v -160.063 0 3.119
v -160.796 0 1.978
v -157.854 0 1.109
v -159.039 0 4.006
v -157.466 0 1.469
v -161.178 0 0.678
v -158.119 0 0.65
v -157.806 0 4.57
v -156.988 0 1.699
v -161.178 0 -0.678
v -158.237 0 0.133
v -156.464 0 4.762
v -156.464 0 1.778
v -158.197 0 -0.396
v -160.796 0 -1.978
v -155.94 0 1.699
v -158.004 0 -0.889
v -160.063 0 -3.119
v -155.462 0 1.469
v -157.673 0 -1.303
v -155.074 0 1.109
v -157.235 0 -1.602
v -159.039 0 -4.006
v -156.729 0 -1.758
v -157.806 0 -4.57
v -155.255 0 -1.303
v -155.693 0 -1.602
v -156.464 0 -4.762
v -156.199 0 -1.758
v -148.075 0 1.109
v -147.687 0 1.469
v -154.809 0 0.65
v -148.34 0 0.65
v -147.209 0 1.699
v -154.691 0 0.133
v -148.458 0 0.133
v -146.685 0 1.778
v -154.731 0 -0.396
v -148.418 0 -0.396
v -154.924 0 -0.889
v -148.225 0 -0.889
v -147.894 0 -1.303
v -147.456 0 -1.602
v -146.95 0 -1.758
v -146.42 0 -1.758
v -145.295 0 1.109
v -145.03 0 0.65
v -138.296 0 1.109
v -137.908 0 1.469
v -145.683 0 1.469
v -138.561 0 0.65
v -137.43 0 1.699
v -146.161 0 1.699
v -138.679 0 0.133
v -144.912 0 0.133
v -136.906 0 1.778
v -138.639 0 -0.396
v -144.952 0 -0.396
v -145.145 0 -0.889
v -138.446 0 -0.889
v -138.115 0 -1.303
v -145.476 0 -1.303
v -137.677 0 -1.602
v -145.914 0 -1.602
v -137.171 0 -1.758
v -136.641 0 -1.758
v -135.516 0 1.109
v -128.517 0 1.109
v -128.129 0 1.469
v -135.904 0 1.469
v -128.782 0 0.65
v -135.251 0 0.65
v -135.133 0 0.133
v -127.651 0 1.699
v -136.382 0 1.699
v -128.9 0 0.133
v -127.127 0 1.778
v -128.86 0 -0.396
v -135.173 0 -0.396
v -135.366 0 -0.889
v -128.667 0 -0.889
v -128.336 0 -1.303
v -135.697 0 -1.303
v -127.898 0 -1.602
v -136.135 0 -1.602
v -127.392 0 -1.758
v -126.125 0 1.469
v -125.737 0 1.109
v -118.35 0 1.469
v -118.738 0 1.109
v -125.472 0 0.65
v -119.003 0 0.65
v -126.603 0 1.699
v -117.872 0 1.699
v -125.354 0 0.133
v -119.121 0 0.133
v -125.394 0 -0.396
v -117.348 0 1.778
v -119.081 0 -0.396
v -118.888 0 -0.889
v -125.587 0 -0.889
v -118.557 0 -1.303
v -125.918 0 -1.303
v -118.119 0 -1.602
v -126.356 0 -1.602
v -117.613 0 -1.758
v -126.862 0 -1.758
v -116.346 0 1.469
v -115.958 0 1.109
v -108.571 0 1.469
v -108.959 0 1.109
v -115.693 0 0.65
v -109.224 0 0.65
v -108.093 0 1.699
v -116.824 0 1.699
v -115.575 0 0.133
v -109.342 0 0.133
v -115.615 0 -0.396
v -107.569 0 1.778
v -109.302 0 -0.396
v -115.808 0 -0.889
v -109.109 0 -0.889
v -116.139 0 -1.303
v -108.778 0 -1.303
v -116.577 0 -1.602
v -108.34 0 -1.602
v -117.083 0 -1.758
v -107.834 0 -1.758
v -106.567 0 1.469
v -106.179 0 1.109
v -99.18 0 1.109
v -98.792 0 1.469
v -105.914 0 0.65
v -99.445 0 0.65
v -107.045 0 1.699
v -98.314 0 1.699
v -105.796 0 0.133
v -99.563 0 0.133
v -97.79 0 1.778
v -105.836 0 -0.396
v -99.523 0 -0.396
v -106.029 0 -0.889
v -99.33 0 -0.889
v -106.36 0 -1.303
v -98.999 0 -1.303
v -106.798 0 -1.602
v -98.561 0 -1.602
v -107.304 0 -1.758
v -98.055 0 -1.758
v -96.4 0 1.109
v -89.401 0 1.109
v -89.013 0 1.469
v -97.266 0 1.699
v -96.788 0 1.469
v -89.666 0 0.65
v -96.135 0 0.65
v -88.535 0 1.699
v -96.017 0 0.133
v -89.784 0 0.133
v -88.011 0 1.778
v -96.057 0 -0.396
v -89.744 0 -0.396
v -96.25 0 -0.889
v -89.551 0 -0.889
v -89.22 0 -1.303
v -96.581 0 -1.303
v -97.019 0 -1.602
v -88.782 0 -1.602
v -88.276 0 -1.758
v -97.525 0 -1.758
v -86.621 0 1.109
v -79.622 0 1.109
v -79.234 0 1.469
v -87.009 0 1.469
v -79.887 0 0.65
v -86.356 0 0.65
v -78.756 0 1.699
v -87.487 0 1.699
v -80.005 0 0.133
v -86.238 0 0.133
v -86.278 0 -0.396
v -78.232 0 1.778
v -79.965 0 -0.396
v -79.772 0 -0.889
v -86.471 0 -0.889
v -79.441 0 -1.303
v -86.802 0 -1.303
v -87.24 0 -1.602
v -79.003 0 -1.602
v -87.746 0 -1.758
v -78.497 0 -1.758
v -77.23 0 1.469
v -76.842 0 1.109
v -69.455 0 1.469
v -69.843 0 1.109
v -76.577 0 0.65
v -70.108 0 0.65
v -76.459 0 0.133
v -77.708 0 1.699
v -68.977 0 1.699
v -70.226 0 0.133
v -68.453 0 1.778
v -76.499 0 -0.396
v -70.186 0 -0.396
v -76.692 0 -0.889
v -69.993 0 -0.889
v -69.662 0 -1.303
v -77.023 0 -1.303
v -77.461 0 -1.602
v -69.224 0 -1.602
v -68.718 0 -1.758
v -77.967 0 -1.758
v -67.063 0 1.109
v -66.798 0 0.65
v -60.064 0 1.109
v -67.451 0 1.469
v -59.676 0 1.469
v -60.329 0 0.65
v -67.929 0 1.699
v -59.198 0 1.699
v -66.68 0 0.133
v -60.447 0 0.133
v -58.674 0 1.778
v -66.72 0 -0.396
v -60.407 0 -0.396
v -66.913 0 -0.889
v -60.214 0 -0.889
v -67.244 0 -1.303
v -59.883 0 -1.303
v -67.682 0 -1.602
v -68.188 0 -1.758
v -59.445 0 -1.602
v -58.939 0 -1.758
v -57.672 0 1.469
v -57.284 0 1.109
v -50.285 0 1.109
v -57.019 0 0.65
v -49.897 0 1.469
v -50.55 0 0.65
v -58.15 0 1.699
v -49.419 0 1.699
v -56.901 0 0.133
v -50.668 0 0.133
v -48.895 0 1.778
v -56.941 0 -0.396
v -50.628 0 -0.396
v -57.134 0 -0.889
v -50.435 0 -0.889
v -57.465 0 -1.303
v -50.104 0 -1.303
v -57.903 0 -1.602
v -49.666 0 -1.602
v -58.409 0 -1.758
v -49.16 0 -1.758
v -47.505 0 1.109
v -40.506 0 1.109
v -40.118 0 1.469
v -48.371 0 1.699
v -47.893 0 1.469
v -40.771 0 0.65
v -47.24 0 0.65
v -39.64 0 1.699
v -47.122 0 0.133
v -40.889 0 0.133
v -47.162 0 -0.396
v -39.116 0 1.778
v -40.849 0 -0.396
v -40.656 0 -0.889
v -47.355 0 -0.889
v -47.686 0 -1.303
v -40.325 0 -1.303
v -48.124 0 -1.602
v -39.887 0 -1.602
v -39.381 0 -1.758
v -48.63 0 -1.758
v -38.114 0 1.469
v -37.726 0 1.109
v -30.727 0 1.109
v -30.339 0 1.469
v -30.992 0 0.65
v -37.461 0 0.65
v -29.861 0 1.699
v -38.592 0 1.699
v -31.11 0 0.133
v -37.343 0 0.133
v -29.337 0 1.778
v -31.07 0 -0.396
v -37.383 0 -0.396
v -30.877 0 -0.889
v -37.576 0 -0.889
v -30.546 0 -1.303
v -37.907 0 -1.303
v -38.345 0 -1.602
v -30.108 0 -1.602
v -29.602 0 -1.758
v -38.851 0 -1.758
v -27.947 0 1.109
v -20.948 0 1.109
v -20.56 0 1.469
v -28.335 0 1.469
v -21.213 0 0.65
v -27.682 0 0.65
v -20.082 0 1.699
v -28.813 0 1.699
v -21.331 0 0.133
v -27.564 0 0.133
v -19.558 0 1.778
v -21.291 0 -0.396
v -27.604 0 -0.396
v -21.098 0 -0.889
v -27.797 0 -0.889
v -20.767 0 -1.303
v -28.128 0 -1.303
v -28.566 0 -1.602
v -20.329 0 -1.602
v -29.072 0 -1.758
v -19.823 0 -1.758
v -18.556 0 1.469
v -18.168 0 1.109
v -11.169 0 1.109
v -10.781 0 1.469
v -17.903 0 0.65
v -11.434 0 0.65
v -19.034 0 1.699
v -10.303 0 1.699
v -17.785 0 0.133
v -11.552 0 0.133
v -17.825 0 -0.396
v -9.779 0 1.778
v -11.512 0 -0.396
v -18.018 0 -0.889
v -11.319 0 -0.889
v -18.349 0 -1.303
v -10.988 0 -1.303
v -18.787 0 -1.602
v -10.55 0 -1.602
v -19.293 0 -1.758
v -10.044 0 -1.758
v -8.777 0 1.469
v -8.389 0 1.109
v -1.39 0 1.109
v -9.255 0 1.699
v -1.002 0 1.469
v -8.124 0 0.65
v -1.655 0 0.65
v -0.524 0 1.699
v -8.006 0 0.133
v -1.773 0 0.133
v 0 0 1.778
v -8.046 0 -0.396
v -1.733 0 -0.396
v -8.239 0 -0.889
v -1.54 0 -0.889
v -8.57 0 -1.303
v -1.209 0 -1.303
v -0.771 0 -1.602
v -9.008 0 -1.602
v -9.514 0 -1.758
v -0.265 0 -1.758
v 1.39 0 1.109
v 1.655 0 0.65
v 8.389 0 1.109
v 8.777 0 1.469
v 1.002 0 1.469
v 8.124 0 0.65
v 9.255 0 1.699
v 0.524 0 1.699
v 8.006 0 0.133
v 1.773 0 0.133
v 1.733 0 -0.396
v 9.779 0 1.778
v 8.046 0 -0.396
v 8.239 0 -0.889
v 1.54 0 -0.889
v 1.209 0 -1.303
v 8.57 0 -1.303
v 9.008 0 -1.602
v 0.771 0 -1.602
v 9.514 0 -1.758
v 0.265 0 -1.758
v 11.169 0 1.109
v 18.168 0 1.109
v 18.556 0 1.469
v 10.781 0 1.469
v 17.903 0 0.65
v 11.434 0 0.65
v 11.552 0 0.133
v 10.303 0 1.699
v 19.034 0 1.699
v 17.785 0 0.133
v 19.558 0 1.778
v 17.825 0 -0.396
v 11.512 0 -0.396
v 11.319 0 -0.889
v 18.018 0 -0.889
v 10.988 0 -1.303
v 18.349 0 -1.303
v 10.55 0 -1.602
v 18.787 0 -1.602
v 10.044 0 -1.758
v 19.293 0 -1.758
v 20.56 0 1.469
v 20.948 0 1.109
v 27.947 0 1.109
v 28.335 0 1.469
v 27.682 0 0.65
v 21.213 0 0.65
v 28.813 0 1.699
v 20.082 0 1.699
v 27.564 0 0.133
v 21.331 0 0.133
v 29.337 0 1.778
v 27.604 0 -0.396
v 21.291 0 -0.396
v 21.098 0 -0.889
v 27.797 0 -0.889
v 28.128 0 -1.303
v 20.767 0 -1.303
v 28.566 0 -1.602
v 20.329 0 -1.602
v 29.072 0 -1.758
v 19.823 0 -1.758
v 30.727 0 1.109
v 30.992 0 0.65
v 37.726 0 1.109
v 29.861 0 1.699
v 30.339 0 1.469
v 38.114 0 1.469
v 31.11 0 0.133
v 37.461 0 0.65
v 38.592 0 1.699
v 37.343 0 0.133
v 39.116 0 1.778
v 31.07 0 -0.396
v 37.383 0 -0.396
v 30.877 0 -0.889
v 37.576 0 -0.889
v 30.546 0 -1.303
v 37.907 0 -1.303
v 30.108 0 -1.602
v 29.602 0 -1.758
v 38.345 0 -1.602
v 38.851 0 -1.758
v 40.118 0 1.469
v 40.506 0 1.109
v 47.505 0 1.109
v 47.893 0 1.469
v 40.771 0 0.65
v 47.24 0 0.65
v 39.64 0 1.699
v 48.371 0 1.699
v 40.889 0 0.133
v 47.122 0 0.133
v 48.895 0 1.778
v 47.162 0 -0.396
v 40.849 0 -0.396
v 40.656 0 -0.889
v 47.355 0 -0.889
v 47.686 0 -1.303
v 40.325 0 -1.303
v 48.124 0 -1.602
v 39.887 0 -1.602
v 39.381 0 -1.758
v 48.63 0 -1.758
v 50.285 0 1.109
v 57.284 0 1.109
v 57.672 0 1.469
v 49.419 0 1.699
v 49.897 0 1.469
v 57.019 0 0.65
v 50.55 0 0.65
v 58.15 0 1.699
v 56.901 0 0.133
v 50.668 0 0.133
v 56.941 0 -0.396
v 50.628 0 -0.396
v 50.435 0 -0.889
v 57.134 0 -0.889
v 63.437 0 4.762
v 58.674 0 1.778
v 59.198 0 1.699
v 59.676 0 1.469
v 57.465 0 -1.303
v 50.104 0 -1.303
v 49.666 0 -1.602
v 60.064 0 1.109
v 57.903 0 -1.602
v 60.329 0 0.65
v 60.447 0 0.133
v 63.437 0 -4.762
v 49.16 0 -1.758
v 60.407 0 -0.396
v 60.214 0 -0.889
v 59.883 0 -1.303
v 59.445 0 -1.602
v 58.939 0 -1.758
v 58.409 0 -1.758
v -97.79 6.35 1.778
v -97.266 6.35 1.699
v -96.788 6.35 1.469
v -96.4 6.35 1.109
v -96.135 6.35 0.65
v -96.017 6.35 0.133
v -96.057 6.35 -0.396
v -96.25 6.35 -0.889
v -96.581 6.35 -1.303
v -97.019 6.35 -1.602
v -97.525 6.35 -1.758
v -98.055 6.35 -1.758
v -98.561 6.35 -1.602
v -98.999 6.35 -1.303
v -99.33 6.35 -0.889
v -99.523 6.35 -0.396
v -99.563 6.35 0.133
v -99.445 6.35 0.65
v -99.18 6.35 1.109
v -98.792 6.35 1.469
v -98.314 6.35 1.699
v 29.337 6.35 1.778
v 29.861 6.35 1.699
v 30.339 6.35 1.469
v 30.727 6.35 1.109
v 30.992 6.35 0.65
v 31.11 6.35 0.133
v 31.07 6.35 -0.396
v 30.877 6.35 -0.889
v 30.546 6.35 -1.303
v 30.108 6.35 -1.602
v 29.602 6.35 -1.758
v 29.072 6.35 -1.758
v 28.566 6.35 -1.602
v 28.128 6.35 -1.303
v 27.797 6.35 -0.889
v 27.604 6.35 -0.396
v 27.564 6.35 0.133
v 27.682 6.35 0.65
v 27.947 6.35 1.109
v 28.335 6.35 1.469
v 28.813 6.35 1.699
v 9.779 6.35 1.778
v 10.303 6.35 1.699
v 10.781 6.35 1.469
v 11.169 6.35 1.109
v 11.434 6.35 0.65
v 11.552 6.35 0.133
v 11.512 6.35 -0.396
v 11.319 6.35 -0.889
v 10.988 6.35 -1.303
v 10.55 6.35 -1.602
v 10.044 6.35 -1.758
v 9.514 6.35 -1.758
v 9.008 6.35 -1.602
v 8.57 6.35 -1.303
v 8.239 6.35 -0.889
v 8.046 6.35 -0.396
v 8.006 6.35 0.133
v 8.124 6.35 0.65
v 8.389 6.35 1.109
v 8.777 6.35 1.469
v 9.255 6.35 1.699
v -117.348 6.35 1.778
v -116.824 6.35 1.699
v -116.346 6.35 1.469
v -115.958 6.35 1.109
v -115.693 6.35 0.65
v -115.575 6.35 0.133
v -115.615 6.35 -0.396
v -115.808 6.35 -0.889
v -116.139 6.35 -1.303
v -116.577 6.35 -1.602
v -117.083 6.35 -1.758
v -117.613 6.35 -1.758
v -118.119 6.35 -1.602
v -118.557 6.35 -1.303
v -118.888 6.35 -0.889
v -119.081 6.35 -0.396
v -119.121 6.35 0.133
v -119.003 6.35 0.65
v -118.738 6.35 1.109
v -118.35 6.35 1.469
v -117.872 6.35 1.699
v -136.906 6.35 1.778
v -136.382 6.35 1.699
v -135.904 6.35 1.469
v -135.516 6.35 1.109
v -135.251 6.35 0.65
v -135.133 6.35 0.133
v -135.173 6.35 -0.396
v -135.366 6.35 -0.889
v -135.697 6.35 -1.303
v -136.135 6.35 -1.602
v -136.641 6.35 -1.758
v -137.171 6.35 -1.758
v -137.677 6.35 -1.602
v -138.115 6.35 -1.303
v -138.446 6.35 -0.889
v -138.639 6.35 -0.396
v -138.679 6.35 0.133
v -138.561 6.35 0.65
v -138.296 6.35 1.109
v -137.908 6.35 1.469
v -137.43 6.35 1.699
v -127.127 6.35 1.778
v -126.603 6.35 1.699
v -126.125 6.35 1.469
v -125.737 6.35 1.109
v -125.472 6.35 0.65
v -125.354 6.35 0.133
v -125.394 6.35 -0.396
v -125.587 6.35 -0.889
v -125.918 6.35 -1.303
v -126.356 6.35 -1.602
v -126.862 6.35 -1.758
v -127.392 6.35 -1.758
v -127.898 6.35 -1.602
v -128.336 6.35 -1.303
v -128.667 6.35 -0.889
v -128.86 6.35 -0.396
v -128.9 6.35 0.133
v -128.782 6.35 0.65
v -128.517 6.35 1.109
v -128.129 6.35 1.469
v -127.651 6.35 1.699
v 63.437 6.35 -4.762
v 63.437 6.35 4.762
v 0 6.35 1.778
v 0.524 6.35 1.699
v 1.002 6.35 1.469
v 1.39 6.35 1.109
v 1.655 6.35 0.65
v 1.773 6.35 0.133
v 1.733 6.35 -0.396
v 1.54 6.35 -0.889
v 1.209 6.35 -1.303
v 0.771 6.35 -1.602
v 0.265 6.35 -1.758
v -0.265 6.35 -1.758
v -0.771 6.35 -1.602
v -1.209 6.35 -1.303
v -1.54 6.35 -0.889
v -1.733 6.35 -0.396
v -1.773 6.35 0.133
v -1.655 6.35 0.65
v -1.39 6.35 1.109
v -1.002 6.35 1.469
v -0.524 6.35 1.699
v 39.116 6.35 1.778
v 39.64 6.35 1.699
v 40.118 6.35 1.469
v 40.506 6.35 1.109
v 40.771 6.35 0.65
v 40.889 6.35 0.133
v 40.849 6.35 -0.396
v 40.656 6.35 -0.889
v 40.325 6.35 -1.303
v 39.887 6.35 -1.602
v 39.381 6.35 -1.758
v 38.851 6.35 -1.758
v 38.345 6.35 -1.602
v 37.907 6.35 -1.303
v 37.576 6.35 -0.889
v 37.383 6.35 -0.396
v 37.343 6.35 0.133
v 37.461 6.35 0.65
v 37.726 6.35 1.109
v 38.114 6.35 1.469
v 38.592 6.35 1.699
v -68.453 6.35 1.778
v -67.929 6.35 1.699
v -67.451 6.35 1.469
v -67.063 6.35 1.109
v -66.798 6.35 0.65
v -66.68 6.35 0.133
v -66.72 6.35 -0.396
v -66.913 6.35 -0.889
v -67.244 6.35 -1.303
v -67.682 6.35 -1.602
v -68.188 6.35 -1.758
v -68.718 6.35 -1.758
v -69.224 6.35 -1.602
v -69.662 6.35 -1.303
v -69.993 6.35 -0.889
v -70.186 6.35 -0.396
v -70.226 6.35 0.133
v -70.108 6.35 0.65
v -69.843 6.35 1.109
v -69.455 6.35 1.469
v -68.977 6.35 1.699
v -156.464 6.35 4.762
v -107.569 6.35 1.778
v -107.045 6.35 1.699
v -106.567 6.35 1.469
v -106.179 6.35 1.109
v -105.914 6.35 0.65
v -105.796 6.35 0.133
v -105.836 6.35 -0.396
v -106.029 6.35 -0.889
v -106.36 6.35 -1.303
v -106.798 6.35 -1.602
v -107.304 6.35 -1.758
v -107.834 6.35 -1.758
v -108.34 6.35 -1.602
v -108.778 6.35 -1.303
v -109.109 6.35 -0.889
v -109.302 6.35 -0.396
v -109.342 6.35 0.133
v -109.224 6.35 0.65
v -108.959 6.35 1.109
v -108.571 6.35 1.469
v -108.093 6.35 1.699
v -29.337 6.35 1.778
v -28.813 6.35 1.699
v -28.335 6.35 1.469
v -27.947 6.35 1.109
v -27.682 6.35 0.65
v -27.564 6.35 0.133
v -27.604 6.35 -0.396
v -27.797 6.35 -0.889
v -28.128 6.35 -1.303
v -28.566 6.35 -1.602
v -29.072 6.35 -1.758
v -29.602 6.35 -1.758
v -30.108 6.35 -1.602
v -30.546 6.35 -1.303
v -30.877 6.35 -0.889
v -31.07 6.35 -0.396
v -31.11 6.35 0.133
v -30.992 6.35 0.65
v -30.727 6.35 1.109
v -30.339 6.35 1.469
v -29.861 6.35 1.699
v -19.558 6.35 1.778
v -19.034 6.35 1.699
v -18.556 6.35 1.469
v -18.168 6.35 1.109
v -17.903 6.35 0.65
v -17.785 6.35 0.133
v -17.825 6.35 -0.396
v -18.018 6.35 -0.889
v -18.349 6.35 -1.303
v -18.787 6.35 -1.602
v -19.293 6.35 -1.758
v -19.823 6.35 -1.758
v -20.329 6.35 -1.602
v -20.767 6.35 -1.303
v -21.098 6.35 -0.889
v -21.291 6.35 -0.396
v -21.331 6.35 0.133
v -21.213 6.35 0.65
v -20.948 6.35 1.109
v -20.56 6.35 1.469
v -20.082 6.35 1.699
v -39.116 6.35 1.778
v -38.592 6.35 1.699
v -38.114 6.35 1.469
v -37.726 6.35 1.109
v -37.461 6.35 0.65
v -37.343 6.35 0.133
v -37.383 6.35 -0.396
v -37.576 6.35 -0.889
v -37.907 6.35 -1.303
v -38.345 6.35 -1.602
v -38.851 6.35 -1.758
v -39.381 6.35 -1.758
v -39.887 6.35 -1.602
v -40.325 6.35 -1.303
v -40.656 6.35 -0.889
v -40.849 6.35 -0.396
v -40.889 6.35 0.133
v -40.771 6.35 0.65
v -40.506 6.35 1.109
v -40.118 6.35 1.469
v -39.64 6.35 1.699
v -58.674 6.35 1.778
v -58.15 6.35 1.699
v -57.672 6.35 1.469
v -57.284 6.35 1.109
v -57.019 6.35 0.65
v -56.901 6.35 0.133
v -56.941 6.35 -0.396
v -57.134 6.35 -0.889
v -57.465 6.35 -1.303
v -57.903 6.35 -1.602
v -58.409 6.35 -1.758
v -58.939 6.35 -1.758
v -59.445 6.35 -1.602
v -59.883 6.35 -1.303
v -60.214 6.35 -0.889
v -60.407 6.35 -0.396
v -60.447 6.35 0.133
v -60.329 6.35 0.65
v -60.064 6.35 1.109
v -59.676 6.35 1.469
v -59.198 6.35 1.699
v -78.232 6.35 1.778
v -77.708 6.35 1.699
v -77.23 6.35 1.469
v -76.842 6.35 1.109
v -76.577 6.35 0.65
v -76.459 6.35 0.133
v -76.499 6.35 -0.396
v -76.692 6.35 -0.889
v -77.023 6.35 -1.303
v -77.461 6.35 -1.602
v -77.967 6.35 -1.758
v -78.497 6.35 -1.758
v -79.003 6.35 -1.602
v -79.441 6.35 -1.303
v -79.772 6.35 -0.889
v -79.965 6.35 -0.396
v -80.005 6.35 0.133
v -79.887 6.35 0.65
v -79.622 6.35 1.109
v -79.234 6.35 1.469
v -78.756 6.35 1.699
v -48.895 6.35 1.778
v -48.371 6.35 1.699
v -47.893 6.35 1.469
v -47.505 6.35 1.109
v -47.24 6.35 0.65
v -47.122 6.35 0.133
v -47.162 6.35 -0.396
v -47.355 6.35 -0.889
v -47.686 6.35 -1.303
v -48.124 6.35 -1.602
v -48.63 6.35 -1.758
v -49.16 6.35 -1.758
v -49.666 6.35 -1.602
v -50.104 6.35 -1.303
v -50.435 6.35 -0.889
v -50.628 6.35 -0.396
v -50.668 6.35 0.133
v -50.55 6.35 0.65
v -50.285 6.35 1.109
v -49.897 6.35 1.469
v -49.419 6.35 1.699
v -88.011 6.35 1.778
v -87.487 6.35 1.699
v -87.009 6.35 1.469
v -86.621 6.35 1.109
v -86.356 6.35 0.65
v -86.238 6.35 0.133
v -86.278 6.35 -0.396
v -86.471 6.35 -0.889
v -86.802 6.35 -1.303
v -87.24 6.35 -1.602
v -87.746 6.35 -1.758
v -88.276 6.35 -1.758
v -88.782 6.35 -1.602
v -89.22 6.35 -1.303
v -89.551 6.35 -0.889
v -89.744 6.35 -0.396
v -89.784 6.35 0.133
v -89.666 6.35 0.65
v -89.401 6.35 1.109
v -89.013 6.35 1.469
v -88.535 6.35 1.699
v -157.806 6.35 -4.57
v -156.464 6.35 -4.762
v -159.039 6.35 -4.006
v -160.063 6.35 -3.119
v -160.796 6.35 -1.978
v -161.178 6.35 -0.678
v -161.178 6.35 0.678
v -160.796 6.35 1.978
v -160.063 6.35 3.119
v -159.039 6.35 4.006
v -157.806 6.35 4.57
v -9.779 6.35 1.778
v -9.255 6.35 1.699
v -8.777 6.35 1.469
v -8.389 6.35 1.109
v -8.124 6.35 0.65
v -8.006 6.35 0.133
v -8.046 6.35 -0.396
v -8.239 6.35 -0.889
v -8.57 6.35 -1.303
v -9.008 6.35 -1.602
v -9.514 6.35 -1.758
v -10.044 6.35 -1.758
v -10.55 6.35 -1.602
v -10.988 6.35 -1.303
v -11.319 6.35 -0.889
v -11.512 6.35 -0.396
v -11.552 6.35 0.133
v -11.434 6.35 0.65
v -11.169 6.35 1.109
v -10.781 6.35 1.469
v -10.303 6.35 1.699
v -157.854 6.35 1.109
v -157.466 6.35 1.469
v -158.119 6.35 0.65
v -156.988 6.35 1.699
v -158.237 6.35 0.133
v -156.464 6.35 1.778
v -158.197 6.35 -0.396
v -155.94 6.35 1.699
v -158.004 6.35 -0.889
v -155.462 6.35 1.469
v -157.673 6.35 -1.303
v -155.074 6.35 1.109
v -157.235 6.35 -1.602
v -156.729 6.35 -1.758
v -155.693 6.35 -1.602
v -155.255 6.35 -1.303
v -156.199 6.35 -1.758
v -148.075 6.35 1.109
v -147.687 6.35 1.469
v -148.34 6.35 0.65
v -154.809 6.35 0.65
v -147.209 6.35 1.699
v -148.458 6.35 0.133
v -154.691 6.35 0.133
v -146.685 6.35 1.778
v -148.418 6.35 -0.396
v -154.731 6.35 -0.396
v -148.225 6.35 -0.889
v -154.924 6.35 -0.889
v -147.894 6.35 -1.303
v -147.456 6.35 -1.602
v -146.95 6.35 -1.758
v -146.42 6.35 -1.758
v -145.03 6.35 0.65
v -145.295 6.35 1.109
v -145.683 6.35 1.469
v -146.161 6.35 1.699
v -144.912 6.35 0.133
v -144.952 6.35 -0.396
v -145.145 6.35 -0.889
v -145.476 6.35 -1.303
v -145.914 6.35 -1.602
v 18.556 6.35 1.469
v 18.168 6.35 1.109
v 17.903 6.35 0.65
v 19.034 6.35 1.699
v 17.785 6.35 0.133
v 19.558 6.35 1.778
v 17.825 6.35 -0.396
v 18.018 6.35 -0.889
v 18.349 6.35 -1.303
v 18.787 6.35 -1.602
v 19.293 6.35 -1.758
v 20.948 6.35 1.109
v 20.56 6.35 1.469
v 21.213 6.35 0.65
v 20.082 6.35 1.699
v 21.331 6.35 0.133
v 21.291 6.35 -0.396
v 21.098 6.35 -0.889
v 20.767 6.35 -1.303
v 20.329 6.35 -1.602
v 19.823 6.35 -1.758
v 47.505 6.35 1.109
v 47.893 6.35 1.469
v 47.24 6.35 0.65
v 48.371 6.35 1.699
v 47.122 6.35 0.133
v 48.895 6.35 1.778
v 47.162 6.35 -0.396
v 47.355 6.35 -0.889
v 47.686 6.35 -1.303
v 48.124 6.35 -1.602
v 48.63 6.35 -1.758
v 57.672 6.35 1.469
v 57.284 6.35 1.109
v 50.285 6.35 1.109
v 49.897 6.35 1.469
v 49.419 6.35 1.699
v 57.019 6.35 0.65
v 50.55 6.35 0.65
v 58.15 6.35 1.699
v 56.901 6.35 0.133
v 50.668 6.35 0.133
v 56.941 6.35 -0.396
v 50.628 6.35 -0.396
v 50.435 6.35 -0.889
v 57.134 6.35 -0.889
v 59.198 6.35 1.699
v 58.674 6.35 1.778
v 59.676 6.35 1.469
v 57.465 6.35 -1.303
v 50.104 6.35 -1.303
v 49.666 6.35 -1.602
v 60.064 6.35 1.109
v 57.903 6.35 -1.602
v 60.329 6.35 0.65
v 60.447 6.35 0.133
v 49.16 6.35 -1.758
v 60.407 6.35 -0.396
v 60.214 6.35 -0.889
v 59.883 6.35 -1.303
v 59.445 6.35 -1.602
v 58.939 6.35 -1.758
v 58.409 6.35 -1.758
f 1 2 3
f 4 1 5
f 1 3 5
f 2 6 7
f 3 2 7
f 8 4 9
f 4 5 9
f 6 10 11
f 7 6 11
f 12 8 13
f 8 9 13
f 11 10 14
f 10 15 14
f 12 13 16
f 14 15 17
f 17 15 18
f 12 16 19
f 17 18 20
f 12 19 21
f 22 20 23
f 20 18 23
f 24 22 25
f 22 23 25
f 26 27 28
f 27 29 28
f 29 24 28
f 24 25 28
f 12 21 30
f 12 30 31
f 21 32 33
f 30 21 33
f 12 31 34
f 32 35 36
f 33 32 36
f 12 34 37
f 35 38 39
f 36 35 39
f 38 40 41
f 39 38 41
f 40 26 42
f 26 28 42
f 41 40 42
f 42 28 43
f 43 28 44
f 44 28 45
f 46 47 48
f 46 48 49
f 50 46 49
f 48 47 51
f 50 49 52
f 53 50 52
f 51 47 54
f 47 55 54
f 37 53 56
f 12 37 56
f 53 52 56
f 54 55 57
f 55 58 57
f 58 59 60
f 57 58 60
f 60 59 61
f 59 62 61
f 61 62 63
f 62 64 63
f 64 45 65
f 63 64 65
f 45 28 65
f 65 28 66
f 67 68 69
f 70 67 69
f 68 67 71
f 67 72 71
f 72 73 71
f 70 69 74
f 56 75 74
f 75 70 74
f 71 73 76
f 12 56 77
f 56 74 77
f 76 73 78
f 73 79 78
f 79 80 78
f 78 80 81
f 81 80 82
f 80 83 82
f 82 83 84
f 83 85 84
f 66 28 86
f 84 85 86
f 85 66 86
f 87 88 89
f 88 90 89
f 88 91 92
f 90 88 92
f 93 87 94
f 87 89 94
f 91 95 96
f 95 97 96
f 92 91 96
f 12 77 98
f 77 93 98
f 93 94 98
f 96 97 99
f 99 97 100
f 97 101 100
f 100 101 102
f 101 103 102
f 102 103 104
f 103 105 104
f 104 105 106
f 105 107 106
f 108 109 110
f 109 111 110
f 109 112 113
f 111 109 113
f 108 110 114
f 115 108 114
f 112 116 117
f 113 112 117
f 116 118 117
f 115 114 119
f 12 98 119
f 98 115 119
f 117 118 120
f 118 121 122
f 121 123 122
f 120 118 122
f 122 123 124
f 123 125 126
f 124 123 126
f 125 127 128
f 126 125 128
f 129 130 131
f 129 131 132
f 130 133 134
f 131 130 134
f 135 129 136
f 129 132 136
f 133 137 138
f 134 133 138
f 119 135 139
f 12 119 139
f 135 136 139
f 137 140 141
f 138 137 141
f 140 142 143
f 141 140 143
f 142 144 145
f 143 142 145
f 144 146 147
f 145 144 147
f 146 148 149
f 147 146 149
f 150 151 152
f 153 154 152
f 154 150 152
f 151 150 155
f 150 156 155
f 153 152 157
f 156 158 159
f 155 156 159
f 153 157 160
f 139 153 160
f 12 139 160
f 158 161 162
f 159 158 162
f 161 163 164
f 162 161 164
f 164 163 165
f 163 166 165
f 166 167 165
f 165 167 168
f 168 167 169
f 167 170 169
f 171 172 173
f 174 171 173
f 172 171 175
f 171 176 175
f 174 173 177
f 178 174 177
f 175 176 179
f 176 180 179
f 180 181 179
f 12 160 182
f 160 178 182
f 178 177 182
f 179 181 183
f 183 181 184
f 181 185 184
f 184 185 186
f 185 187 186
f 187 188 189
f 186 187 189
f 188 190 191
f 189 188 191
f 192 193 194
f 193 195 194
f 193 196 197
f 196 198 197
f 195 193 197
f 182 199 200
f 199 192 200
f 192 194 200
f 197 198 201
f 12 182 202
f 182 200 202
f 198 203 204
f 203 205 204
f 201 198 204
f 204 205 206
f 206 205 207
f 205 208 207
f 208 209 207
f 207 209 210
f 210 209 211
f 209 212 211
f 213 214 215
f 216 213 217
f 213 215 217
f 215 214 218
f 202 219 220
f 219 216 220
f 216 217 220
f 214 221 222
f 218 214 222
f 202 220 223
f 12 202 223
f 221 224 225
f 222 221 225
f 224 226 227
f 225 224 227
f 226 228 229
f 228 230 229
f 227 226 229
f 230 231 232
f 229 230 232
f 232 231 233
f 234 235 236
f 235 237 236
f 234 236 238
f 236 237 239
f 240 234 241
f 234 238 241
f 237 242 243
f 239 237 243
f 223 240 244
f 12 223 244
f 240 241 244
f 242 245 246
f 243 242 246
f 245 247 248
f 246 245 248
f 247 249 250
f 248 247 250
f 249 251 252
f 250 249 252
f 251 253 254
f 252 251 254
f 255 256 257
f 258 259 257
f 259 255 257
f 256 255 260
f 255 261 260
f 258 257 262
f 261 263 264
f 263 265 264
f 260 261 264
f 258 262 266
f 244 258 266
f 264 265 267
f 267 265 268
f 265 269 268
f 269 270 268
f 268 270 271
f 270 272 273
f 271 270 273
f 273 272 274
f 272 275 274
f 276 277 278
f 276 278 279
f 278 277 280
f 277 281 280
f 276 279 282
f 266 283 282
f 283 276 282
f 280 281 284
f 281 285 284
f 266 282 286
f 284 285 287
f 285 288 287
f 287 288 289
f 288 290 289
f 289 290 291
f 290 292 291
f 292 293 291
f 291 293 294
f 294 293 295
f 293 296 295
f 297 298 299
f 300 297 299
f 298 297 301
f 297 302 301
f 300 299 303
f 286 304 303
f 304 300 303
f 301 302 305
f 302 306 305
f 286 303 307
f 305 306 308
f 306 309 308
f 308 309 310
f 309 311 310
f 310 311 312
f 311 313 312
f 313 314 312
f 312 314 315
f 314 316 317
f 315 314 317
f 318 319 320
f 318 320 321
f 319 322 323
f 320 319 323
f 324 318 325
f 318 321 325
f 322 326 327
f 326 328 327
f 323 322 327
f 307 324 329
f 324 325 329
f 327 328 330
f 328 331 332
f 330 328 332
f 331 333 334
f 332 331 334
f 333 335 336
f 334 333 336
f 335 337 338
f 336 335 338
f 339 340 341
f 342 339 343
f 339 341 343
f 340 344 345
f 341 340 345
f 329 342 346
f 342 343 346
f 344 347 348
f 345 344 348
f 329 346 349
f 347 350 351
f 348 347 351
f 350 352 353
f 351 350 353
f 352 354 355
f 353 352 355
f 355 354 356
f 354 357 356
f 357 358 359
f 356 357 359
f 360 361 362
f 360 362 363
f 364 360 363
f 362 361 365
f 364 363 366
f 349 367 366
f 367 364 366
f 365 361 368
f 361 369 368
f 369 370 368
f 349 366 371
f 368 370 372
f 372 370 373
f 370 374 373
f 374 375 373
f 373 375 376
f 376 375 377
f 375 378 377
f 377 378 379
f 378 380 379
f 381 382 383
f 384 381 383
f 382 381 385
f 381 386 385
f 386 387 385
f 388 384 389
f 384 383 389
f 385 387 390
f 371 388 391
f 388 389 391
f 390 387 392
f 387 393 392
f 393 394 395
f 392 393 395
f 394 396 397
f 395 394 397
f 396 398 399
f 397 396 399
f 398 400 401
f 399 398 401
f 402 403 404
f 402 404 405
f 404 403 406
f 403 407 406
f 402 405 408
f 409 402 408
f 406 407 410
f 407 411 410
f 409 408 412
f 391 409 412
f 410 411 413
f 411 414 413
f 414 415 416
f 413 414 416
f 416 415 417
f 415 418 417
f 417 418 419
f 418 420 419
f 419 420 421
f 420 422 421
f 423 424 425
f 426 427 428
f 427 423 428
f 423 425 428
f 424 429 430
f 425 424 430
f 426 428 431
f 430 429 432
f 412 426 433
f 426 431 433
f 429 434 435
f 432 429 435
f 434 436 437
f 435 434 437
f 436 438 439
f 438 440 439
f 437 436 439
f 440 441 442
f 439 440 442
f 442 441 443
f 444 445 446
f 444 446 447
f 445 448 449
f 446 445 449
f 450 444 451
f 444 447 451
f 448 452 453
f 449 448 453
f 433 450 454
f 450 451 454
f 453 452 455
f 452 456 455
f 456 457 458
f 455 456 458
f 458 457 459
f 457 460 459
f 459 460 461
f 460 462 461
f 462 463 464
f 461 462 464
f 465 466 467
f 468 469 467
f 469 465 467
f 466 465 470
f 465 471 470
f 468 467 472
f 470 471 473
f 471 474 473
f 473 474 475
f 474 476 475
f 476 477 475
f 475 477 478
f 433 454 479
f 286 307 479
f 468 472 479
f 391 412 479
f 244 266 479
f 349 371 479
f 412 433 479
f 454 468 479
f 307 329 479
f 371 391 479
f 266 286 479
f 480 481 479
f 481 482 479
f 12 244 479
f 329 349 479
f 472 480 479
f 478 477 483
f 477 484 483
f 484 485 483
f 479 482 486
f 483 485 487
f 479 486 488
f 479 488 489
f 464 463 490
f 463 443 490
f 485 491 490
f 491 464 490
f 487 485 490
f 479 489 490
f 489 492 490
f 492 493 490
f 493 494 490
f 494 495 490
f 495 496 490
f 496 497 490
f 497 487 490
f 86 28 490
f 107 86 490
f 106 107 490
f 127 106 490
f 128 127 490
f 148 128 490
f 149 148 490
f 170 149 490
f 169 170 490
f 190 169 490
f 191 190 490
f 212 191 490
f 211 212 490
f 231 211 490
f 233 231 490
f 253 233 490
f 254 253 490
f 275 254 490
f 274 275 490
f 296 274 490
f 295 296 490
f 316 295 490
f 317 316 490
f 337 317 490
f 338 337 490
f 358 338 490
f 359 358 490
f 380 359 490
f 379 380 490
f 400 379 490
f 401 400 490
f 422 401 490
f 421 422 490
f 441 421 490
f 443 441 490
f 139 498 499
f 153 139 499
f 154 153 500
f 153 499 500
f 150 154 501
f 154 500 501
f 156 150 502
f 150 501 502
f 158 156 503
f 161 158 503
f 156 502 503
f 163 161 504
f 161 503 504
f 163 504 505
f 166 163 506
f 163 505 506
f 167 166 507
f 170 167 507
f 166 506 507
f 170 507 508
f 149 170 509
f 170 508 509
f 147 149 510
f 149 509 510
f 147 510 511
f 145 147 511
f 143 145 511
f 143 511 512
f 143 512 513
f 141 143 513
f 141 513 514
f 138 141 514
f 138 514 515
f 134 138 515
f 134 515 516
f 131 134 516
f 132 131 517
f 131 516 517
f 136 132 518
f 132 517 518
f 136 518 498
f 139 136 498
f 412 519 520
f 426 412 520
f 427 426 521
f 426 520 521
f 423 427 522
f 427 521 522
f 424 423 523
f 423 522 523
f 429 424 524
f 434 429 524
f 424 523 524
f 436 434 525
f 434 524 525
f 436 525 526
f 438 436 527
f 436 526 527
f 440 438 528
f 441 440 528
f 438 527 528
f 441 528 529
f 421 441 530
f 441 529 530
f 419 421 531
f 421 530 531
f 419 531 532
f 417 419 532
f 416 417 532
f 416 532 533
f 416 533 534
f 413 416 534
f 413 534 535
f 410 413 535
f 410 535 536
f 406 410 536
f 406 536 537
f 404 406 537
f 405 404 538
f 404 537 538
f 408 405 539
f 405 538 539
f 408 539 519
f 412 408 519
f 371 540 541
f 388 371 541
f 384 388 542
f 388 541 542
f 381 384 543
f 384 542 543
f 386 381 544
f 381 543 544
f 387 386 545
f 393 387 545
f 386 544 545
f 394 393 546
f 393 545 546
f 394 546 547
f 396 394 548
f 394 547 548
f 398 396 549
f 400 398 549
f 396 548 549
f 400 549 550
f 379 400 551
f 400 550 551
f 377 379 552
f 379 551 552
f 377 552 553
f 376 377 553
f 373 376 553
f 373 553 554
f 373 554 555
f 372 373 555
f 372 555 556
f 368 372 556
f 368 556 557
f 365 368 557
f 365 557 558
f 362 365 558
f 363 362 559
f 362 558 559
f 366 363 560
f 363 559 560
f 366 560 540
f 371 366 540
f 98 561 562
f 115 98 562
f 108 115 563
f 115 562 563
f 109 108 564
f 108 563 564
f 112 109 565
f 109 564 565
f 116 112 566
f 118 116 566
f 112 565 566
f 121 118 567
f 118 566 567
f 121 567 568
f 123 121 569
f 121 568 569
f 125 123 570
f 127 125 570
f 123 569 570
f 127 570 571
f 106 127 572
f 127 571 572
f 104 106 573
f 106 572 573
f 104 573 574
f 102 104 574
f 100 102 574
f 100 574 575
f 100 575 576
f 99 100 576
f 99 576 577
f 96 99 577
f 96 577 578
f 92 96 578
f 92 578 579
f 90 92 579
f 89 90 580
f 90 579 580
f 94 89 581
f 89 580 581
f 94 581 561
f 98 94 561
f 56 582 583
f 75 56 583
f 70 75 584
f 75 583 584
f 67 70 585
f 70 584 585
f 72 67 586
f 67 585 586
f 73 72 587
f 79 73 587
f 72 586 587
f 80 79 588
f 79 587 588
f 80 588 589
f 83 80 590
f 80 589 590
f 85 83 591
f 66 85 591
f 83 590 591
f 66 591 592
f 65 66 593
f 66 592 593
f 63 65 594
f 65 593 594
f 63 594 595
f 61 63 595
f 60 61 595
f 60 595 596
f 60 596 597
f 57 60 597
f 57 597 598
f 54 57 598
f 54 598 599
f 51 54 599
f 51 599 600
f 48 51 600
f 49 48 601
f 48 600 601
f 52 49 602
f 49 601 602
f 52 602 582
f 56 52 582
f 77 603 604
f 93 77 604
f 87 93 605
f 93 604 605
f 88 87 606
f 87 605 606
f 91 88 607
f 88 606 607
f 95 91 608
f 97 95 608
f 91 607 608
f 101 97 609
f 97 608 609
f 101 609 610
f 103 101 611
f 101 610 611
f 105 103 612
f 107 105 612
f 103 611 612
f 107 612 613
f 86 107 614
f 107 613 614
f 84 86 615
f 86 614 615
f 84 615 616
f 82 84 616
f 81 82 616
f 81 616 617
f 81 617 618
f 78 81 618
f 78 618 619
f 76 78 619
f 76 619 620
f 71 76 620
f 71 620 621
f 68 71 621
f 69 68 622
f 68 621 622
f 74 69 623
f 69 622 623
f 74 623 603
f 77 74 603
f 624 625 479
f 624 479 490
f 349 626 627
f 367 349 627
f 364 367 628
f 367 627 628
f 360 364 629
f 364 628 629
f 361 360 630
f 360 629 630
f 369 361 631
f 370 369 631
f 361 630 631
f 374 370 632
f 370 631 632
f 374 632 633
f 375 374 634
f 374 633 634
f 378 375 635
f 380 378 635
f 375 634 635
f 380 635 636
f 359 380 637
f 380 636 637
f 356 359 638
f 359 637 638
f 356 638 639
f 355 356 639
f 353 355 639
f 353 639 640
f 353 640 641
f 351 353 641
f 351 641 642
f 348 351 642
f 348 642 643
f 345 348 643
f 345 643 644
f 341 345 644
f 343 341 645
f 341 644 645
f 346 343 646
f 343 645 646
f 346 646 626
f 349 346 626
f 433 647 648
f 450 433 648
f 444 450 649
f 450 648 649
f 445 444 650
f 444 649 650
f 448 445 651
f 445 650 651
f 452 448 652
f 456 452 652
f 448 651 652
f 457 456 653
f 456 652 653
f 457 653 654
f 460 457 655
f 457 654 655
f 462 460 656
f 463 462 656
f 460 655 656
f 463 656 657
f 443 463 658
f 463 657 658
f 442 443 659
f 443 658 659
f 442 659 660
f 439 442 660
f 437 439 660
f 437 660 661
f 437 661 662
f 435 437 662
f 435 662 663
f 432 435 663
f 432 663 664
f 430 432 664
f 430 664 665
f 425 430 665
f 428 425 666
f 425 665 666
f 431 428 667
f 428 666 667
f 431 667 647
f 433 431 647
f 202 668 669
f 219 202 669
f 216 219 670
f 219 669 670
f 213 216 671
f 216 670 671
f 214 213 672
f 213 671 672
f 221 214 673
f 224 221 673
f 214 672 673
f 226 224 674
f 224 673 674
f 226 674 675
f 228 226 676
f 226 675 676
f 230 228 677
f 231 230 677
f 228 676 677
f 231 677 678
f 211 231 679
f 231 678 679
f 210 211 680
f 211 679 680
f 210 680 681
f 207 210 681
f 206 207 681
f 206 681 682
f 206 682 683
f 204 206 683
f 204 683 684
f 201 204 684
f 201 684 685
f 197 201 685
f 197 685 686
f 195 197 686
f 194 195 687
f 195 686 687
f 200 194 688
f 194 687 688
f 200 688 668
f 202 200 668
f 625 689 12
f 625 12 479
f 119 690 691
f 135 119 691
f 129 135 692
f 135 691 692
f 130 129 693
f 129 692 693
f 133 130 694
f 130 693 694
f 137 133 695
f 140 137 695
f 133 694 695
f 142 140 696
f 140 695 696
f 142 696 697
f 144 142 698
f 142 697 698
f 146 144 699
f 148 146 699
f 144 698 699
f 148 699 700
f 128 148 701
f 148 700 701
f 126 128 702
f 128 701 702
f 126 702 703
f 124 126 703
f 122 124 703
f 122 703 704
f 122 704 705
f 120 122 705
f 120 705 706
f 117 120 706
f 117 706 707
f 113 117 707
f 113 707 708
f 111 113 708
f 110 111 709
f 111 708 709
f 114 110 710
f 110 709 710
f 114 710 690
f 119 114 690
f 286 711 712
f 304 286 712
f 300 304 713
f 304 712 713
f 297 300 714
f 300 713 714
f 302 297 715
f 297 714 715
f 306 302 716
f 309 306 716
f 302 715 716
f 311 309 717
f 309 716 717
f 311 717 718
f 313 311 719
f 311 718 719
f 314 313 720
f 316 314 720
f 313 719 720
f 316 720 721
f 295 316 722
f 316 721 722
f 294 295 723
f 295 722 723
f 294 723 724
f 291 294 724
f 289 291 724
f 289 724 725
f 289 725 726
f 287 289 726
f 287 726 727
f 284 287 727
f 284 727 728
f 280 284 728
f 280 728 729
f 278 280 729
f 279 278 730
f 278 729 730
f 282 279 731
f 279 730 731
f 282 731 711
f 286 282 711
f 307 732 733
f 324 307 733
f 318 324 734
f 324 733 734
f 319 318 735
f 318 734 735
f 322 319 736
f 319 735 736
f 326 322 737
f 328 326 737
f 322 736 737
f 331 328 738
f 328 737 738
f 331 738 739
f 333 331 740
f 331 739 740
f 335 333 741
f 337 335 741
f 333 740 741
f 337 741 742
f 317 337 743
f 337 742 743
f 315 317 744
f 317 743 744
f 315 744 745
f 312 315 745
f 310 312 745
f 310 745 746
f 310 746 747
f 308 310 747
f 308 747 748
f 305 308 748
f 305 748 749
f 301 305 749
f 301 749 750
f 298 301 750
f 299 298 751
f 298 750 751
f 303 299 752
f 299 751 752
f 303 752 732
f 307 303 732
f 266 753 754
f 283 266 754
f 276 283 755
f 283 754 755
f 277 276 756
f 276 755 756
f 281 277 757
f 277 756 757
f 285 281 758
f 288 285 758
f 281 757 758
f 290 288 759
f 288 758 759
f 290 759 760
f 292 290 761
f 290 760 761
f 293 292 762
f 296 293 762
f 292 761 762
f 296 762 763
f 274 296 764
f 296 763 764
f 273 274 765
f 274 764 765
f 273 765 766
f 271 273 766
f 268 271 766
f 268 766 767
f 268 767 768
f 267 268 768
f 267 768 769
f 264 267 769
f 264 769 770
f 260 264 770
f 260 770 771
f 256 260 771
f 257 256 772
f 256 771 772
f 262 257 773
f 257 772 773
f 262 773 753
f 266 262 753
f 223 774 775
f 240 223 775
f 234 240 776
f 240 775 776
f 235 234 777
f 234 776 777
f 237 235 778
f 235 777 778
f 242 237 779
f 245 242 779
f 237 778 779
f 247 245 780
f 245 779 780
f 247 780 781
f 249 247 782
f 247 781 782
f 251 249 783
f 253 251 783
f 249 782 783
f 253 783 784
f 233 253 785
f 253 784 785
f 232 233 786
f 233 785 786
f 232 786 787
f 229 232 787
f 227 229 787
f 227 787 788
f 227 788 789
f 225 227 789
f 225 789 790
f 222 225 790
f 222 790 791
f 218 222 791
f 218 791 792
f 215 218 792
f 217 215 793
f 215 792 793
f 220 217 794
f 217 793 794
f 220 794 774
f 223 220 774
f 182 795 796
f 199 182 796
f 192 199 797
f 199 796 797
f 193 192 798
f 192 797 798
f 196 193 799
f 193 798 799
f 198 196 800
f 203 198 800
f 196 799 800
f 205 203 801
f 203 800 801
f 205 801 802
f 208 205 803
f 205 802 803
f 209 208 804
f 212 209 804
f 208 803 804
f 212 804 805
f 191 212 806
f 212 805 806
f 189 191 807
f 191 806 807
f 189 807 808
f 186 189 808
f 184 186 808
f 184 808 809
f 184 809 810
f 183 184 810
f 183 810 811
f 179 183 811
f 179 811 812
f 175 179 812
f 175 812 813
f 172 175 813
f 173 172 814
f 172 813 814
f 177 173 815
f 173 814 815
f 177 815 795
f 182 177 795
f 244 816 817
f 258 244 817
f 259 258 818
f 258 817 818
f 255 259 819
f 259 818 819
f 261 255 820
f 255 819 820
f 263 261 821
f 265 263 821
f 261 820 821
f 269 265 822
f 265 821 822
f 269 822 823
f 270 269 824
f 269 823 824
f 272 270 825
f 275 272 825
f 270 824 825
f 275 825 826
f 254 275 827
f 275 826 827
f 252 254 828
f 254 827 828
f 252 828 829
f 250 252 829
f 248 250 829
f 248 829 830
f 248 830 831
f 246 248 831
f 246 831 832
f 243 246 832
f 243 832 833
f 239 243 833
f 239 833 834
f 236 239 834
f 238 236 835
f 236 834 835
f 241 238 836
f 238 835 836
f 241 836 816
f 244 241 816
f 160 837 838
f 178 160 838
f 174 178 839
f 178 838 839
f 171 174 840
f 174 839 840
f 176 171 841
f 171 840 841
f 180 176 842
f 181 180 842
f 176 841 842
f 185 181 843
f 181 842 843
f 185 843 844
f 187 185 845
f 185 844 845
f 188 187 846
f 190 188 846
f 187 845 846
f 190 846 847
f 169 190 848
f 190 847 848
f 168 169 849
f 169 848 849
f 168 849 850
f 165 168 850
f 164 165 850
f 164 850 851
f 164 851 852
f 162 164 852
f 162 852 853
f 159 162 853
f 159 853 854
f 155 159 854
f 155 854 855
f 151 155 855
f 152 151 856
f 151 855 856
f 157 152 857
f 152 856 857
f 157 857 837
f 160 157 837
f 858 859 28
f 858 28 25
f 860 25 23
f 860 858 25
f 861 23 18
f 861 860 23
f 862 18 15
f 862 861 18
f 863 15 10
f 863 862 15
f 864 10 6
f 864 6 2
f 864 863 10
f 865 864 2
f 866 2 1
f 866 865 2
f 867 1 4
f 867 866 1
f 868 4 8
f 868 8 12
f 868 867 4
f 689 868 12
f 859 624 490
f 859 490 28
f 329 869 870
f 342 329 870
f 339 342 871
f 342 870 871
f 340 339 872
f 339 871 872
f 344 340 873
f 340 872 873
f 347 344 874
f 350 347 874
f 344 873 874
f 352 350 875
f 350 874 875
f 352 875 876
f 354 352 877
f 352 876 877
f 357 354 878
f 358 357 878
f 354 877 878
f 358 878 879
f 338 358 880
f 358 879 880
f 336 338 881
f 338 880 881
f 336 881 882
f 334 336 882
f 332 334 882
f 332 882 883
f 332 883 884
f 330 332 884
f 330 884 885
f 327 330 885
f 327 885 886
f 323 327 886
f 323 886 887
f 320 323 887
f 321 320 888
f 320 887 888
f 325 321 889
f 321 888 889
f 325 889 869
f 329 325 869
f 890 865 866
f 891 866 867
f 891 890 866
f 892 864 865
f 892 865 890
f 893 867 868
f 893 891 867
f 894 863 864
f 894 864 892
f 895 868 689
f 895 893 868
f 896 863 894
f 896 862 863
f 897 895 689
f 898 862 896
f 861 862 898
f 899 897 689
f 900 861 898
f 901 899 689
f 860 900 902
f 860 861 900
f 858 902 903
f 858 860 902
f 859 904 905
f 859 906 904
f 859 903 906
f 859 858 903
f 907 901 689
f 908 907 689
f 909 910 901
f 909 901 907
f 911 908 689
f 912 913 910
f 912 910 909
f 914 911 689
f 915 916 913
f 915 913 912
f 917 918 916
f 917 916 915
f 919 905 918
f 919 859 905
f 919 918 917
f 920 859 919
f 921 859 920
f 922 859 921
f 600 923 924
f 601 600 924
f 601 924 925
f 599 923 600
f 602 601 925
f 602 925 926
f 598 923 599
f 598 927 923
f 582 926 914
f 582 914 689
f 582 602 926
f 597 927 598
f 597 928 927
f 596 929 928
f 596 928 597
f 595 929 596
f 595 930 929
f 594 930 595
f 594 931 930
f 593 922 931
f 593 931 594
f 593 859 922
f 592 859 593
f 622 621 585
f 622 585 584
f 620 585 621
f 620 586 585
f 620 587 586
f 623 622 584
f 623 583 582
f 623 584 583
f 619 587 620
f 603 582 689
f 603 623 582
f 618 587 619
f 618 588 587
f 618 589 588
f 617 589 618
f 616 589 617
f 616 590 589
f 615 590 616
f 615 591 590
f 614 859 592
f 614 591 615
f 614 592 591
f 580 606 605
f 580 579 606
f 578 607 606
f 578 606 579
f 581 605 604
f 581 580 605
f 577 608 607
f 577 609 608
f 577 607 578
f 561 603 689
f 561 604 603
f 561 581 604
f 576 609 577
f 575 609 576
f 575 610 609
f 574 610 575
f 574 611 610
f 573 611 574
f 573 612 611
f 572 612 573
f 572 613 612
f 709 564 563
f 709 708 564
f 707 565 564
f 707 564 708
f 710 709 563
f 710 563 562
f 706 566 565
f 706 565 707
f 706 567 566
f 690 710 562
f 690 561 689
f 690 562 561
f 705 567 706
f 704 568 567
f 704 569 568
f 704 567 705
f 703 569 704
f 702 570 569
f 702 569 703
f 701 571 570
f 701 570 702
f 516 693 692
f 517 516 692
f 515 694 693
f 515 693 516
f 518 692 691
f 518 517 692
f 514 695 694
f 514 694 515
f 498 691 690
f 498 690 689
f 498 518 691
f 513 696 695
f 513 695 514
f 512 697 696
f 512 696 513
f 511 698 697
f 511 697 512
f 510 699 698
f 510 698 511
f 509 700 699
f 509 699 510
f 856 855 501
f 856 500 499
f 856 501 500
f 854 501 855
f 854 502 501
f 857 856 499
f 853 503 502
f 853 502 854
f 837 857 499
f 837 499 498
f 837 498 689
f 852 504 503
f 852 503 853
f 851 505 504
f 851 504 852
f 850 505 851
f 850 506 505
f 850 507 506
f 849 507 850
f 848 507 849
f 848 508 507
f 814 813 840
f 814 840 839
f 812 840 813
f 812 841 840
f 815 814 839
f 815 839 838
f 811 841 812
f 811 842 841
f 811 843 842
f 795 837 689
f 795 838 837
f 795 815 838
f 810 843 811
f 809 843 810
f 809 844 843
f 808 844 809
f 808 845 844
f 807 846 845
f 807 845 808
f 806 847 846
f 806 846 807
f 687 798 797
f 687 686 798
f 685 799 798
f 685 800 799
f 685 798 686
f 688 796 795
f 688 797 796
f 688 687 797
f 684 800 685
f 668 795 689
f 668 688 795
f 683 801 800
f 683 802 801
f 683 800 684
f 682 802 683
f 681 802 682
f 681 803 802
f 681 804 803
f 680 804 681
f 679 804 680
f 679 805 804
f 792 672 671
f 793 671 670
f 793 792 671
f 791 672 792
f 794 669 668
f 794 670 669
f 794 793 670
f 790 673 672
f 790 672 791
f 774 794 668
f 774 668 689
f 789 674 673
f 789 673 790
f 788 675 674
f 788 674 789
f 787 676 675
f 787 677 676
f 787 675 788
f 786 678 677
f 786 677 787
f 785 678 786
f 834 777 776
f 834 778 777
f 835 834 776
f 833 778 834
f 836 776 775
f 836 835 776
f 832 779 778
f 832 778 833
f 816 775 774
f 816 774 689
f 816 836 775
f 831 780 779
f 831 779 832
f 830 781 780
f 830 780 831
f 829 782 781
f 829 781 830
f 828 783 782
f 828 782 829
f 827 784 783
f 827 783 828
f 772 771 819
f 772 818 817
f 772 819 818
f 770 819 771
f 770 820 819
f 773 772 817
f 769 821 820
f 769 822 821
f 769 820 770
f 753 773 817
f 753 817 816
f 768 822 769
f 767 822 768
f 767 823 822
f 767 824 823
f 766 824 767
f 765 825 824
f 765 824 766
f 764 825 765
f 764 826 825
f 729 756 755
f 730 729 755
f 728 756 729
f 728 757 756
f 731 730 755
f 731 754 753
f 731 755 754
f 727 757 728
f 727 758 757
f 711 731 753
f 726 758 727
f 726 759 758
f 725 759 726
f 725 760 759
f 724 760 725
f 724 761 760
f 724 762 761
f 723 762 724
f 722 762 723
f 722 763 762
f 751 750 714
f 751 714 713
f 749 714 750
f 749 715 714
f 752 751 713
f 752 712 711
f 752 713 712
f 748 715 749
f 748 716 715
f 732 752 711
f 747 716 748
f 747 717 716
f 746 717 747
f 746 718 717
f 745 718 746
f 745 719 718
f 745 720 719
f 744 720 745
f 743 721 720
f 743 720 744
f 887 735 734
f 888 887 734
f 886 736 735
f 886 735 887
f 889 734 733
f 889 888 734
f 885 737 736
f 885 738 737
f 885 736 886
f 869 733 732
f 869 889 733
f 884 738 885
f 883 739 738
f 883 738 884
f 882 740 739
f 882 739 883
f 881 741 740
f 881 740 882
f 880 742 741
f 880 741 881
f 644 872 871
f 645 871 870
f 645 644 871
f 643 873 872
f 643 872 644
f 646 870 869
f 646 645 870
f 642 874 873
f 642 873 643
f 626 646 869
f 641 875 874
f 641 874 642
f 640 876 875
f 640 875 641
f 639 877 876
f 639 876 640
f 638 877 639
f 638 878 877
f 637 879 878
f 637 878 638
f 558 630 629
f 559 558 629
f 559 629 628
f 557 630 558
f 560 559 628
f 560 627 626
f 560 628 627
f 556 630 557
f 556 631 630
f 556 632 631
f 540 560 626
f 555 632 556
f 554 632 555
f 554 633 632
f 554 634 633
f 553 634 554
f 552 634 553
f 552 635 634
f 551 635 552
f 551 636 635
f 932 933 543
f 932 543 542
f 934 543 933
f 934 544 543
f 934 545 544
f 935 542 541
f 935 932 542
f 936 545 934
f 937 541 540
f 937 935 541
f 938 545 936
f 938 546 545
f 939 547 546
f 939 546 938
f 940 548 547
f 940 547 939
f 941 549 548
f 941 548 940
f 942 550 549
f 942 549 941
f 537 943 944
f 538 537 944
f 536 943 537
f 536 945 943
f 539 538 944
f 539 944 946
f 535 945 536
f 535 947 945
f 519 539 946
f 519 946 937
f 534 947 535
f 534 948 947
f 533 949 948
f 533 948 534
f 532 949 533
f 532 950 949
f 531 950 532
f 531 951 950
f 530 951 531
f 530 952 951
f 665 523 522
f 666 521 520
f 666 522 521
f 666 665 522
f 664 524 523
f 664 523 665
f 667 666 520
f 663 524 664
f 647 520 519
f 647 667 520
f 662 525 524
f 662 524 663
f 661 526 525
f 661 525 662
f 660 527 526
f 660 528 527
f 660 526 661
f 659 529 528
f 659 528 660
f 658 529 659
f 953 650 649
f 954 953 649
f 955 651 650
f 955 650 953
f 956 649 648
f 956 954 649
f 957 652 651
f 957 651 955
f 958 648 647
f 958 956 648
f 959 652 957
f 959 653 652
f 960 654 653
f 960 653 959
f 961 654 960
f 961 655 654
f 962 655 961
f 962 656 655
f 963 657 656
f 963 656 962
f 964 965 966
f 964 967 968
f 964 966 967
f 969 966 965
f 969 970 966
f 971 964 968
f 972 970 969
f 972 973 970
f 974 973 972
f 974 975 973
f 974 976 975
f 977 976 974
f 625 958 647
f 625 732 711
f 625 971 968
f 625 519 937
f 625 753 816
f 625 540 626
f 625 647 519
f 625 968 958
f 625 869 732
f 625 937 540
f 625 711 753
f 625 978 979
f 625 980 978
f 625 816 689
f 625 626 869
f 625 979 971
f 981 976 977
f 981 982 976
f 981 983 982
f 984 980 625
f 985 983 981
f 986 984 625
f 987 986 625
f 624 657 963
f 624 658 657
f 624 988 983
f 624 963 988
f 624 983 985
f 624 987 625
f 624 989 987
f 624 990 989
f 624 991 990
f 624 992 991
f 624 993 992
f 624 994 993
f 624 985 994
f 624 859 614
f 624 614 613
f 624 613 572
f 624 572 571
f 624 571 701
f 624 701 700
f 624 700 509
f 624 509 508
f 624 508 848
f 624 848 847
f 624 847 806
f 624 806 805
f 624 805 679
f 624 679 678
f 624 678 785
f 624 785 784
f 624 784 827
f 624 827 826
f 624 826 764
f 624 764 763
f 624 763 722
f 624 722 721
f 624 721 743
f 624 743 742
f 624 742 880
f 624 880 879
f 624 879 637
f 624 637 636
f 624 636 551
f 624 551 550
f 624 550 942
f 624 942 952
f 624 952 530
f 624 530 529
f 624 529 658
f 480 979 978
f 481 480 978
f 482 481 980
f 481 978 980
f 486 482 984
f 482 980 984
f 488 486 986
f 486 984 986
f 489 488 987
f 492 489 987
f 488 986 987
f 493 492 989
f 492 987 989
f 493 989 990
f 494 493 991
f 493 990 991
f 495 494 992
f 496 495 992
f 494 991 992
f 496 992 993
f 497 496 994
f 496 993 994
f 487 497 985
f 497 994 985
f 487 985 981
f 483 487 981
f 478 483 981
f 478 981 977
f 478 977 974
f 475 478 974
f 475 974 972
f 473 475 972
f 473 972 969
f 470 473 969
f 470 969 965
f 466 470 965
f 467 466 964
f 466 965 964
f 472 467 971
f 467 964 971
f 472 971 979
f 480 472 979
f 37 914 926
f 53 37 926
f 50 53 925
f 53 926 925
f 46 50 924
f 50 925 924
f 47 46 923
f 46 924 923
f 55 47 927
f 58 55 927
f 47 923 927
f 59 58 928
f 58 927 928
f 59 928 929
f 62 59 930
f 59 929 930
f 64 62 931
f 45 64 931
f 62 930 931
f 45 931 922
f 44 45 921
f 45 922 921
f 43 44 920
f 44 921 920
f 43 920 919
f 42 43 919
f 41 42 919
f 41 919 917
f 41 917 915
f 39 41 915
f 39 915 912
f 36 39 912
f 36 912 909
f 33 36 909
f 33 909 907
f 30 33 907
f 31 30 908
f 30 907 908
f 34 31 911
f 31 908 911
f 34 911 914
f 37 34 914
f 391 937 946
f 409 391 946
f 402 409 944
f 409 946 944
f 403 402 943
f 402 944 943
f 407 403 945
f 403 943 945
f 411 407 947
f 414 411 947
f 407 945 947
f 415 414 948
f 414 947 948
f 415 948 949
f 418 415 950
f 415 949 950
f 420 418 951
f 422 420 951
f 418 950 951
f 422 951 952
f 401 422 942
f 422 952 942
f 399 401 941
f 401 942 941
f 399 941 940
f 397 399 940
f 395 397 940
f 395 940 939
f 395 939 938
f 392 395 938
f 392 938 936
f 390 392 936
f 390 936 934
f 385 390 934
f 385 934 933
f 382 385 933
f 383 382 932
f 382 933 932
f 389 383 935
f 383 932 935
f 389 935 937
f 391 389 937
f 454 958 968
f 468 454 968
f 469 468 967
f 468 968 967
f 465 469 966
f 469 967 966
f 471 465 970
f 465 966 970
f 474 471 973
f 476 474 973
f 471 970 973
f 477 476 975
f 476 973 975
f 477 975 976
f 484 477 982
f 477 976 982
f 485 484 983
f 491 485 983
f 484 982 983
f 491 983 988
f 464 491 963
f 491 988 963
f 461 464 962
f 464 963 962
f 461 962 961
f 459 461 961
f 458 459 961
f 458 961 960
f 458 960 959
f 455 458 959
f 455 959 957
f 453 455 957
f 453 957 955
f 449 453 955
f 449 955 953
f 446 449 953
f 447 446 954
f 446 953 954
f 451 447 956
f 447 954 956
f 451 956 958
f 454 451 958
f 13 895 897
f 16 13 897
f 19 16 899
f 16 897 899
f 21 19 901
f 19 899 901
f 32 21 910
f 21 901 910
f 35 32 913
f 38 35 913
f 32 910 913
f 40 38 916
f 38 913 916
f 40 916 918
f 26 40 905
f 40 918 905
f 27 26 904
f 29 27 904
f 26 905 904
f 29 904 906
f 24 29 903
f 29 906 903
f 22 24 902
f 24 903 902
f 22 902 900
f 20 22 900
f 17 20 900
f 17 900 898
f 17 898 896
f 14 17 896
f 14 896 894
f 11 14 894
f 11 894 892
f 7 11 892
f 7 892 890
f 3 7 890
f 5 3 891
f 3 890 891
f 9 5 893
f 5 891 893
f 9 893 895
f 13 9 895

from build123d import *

# Parameters (mm, degrees)
SKETCH1_R           = 1.778
BOSS_EXTRUDE1_DEPTH = 6.35
SKETCH2_W           = 100.128840489
SKETCH2_H           = 9.525
CUT_EXTRUDE1_DEPTH  = 162.421771173


with BuildPart() as part:
    # Sketch1 → Boss-Extrude1 (new body)
    with BuildSketch(Plane(origin=(0, 6.35, 0), x_dir=(1, 0, 0), z_dir=(0, 1, 0))):
        with BuildLine():
            Line((156.464, 4.7625), (-156.464, 4.7625))
            ThreePointArc((-156.464, 4.7625), (-161.2265, 0), (-156.464, -4.7625))
            Line((-156.464, -4.7625), (156.464, -4.7625))
            ThreePointArc((156.464, -4.7625), (161.2265, 0), (156.464, 4.7625))
        make_face()
        with Locations(Location((156.464, 0, 0), (0, 0, 270))):
            Circle(SKETCH1_R, mode=Mode.SUBTRACT)
        with Locations(Location((146.685, 0, 0), (0, 0, 270))):
            Circle(SKETCH1_R, mode=Mode.SUBTRACT)
        with Locations(Location((136.906, 0, 0), (0, 0, 270))):
            Circle(SKETCH1_R, mode=Mode.SUBTRACT)
        with Locations(Location((127.127, 0, 0), (0, 0, 270))):
            Circle(SKETCH1_R, mode=Mode.SUBTRACT)
        with Locations(Location((117.348, 0, 0), (0, 0, 270))):
            Circle(SKETCH1_R, mode=Mode.SUBTRACT)
        with Locations(Location((107.569, 0, 0), (0, 0, 270))):
            Circle(SKETCH1_R, mode=Mode.SUBTRACT)
        with Locations(Location((97.79, 0, 0), (0, 0, 270))):
            Circle(SKETCH1_R, mode=Mode.SUBTRACT)
        with Locations(Location((88.011, 0, 0), (0, 0, 270))):
            Circle(SKETCH1_R, mode=Mode.SUBTRACT)
        with Locations(Location((78.232, 0, 0), (0, 0, 270))):
            Circle(SKETCH1_R, mode=Mode.SUBTRACT)
        with Locations(Location((68.453, 0, 0), (0, 0, 270))):
            Circle(SKETCH1_R, mode=Mode.SUBTRACT)
        with Locations(Location((58.674, 0, 0), (0, 0, 270))):
            Circle(SKETCH1_R, mode=Mode.SUBTRACT)
        with Locations(Location((48.895, 0, 0), (0, 0, 270))):
            Circle(SKETCH1_R, mode=Mode.SUBTRACT)
        with Locations(Location((39.116, 0, 0), (0, 0, 270))):
            Circle(SKETCH1_R, mode=Mode.SUBTRACT)
        with Locations(Location((29.337, 0, 0), (0, 0, 270))):
            Circle(SKETCH1_R, mode=Mode.SUBTRACT)
        with Locations(Location((19.558, 0, 0), (0, 0, 270))):
            Circle(SKETCH1_R, mode=Mode.SUBTRACT)
        with Locations(Location((9.779, 0, 0), (0, 0, 270))):
            Circle(SKETCH1_R, mode=Mode.SUBTRACT)
        with Locations(Location((0, 0, 0), (0, 0, 270))):
            Circle(SKETCH1_R, mode=Mode.SUBTRACT)
        with Locations(Location((-9.779, 0, 0), (0, 0, 270))):
            Circle(SKETCH1_R, mode=Mode.SUBTRACT)
        with Locations(Location((-19.558, 0, 0), (0, 0, 270))):
            Circle(SKETCH1_R, mode=Mode.SUBTRACT)
        with Locations(Location((-29.337, 0, 0), (0, 0, 270))):
            Circle(SKETCH1_R, mode=Mode.SUBTRACT)
        with Locations(Location((-39.116, 0, 0), (0, 0, 270))):
            Circle(SKETCH1_R, mode=Mode.SUBTRACT)
        with Locations(Location((-48.895, 0, 0), (0, 0, 270))):
            Circle(SKETCH1_R, mode=Mode.SUBTRACT)
        with Locations(Location((-58.674, 0, 0), (0, 0, 270))):
            Circle(SKETCH1_R, mode=Mode.SUBTRACT)
        with Locations(Location((-68.453, 0, 0), (0, 0, 270))):
            Circle(SKETCH1_R, mode=Mode.SUBTRACT)
        with Locations(Location((-78.232, 0, 0), (0, 0, 270))):
            Circle(SKETCH1_R, mode=Mode.SUBTRACT)
        with Locations(Location((-88.011, 0, 0), (0, 0, 270))):
            Circle(SKETCH1_R, mode=Mode.SUBTRACT)
        with Locations(Location((-97.79, 0, 0), (0, 0, 270))):
            Circle(SKETCH1_R, mode=Mode.SUBTRACT)
        with Locations(Location((-107.569, 0, 0), (0, 0, 270))):
            Circle(SKETCH1_R, mode=Mode.SUBTRACT)
        with Locations(Location((-117.348, 0, 0), (0, 0, 270))):
            Circle(SKETCH1_R, mode=Mode.SUBTRACT)
        with Locations(Location((-127.127, 0, 0), (0, 0, 270))):
            Circle(SKETCH1_R, mode=Mode.SUBTRACT)
        with Locations(Location((-136.906, 0, 0), (0, 0, 270))):
            Circle(SKETCH1_R, mode=Mode.SUBTRACT)
        with Locations(Location((-146.685, 0, 0), (0, 0, 270))):
            Circle(SKETCH1_R, mode=Mode.SUBTRACT)
        with Locations(Location((-156.464, 0, 0), (0, 0, 270))):
            Circle(SKETCH1_R, mode=Mode.SUBTRACT)
    extrude(amount=-BOSS_EXTRUDE1_DEPTH)

    # Sketch2 → Cut-Extrude1 (cut, through all)
    with BuildSketch(Plane(origin=(0, 6.35, 0), x_dir=(1, 0, 0), z_dir=(0, 1, 0))):
        with Locations((113.500920245, 0)):
            Rectangle(SKETCH2_W, SKETCH2_H)
    extrude(amount=-CUT_EXTRUDE1_DEPTH, mode=Mode.SUBTRACT)


solid = part.part
